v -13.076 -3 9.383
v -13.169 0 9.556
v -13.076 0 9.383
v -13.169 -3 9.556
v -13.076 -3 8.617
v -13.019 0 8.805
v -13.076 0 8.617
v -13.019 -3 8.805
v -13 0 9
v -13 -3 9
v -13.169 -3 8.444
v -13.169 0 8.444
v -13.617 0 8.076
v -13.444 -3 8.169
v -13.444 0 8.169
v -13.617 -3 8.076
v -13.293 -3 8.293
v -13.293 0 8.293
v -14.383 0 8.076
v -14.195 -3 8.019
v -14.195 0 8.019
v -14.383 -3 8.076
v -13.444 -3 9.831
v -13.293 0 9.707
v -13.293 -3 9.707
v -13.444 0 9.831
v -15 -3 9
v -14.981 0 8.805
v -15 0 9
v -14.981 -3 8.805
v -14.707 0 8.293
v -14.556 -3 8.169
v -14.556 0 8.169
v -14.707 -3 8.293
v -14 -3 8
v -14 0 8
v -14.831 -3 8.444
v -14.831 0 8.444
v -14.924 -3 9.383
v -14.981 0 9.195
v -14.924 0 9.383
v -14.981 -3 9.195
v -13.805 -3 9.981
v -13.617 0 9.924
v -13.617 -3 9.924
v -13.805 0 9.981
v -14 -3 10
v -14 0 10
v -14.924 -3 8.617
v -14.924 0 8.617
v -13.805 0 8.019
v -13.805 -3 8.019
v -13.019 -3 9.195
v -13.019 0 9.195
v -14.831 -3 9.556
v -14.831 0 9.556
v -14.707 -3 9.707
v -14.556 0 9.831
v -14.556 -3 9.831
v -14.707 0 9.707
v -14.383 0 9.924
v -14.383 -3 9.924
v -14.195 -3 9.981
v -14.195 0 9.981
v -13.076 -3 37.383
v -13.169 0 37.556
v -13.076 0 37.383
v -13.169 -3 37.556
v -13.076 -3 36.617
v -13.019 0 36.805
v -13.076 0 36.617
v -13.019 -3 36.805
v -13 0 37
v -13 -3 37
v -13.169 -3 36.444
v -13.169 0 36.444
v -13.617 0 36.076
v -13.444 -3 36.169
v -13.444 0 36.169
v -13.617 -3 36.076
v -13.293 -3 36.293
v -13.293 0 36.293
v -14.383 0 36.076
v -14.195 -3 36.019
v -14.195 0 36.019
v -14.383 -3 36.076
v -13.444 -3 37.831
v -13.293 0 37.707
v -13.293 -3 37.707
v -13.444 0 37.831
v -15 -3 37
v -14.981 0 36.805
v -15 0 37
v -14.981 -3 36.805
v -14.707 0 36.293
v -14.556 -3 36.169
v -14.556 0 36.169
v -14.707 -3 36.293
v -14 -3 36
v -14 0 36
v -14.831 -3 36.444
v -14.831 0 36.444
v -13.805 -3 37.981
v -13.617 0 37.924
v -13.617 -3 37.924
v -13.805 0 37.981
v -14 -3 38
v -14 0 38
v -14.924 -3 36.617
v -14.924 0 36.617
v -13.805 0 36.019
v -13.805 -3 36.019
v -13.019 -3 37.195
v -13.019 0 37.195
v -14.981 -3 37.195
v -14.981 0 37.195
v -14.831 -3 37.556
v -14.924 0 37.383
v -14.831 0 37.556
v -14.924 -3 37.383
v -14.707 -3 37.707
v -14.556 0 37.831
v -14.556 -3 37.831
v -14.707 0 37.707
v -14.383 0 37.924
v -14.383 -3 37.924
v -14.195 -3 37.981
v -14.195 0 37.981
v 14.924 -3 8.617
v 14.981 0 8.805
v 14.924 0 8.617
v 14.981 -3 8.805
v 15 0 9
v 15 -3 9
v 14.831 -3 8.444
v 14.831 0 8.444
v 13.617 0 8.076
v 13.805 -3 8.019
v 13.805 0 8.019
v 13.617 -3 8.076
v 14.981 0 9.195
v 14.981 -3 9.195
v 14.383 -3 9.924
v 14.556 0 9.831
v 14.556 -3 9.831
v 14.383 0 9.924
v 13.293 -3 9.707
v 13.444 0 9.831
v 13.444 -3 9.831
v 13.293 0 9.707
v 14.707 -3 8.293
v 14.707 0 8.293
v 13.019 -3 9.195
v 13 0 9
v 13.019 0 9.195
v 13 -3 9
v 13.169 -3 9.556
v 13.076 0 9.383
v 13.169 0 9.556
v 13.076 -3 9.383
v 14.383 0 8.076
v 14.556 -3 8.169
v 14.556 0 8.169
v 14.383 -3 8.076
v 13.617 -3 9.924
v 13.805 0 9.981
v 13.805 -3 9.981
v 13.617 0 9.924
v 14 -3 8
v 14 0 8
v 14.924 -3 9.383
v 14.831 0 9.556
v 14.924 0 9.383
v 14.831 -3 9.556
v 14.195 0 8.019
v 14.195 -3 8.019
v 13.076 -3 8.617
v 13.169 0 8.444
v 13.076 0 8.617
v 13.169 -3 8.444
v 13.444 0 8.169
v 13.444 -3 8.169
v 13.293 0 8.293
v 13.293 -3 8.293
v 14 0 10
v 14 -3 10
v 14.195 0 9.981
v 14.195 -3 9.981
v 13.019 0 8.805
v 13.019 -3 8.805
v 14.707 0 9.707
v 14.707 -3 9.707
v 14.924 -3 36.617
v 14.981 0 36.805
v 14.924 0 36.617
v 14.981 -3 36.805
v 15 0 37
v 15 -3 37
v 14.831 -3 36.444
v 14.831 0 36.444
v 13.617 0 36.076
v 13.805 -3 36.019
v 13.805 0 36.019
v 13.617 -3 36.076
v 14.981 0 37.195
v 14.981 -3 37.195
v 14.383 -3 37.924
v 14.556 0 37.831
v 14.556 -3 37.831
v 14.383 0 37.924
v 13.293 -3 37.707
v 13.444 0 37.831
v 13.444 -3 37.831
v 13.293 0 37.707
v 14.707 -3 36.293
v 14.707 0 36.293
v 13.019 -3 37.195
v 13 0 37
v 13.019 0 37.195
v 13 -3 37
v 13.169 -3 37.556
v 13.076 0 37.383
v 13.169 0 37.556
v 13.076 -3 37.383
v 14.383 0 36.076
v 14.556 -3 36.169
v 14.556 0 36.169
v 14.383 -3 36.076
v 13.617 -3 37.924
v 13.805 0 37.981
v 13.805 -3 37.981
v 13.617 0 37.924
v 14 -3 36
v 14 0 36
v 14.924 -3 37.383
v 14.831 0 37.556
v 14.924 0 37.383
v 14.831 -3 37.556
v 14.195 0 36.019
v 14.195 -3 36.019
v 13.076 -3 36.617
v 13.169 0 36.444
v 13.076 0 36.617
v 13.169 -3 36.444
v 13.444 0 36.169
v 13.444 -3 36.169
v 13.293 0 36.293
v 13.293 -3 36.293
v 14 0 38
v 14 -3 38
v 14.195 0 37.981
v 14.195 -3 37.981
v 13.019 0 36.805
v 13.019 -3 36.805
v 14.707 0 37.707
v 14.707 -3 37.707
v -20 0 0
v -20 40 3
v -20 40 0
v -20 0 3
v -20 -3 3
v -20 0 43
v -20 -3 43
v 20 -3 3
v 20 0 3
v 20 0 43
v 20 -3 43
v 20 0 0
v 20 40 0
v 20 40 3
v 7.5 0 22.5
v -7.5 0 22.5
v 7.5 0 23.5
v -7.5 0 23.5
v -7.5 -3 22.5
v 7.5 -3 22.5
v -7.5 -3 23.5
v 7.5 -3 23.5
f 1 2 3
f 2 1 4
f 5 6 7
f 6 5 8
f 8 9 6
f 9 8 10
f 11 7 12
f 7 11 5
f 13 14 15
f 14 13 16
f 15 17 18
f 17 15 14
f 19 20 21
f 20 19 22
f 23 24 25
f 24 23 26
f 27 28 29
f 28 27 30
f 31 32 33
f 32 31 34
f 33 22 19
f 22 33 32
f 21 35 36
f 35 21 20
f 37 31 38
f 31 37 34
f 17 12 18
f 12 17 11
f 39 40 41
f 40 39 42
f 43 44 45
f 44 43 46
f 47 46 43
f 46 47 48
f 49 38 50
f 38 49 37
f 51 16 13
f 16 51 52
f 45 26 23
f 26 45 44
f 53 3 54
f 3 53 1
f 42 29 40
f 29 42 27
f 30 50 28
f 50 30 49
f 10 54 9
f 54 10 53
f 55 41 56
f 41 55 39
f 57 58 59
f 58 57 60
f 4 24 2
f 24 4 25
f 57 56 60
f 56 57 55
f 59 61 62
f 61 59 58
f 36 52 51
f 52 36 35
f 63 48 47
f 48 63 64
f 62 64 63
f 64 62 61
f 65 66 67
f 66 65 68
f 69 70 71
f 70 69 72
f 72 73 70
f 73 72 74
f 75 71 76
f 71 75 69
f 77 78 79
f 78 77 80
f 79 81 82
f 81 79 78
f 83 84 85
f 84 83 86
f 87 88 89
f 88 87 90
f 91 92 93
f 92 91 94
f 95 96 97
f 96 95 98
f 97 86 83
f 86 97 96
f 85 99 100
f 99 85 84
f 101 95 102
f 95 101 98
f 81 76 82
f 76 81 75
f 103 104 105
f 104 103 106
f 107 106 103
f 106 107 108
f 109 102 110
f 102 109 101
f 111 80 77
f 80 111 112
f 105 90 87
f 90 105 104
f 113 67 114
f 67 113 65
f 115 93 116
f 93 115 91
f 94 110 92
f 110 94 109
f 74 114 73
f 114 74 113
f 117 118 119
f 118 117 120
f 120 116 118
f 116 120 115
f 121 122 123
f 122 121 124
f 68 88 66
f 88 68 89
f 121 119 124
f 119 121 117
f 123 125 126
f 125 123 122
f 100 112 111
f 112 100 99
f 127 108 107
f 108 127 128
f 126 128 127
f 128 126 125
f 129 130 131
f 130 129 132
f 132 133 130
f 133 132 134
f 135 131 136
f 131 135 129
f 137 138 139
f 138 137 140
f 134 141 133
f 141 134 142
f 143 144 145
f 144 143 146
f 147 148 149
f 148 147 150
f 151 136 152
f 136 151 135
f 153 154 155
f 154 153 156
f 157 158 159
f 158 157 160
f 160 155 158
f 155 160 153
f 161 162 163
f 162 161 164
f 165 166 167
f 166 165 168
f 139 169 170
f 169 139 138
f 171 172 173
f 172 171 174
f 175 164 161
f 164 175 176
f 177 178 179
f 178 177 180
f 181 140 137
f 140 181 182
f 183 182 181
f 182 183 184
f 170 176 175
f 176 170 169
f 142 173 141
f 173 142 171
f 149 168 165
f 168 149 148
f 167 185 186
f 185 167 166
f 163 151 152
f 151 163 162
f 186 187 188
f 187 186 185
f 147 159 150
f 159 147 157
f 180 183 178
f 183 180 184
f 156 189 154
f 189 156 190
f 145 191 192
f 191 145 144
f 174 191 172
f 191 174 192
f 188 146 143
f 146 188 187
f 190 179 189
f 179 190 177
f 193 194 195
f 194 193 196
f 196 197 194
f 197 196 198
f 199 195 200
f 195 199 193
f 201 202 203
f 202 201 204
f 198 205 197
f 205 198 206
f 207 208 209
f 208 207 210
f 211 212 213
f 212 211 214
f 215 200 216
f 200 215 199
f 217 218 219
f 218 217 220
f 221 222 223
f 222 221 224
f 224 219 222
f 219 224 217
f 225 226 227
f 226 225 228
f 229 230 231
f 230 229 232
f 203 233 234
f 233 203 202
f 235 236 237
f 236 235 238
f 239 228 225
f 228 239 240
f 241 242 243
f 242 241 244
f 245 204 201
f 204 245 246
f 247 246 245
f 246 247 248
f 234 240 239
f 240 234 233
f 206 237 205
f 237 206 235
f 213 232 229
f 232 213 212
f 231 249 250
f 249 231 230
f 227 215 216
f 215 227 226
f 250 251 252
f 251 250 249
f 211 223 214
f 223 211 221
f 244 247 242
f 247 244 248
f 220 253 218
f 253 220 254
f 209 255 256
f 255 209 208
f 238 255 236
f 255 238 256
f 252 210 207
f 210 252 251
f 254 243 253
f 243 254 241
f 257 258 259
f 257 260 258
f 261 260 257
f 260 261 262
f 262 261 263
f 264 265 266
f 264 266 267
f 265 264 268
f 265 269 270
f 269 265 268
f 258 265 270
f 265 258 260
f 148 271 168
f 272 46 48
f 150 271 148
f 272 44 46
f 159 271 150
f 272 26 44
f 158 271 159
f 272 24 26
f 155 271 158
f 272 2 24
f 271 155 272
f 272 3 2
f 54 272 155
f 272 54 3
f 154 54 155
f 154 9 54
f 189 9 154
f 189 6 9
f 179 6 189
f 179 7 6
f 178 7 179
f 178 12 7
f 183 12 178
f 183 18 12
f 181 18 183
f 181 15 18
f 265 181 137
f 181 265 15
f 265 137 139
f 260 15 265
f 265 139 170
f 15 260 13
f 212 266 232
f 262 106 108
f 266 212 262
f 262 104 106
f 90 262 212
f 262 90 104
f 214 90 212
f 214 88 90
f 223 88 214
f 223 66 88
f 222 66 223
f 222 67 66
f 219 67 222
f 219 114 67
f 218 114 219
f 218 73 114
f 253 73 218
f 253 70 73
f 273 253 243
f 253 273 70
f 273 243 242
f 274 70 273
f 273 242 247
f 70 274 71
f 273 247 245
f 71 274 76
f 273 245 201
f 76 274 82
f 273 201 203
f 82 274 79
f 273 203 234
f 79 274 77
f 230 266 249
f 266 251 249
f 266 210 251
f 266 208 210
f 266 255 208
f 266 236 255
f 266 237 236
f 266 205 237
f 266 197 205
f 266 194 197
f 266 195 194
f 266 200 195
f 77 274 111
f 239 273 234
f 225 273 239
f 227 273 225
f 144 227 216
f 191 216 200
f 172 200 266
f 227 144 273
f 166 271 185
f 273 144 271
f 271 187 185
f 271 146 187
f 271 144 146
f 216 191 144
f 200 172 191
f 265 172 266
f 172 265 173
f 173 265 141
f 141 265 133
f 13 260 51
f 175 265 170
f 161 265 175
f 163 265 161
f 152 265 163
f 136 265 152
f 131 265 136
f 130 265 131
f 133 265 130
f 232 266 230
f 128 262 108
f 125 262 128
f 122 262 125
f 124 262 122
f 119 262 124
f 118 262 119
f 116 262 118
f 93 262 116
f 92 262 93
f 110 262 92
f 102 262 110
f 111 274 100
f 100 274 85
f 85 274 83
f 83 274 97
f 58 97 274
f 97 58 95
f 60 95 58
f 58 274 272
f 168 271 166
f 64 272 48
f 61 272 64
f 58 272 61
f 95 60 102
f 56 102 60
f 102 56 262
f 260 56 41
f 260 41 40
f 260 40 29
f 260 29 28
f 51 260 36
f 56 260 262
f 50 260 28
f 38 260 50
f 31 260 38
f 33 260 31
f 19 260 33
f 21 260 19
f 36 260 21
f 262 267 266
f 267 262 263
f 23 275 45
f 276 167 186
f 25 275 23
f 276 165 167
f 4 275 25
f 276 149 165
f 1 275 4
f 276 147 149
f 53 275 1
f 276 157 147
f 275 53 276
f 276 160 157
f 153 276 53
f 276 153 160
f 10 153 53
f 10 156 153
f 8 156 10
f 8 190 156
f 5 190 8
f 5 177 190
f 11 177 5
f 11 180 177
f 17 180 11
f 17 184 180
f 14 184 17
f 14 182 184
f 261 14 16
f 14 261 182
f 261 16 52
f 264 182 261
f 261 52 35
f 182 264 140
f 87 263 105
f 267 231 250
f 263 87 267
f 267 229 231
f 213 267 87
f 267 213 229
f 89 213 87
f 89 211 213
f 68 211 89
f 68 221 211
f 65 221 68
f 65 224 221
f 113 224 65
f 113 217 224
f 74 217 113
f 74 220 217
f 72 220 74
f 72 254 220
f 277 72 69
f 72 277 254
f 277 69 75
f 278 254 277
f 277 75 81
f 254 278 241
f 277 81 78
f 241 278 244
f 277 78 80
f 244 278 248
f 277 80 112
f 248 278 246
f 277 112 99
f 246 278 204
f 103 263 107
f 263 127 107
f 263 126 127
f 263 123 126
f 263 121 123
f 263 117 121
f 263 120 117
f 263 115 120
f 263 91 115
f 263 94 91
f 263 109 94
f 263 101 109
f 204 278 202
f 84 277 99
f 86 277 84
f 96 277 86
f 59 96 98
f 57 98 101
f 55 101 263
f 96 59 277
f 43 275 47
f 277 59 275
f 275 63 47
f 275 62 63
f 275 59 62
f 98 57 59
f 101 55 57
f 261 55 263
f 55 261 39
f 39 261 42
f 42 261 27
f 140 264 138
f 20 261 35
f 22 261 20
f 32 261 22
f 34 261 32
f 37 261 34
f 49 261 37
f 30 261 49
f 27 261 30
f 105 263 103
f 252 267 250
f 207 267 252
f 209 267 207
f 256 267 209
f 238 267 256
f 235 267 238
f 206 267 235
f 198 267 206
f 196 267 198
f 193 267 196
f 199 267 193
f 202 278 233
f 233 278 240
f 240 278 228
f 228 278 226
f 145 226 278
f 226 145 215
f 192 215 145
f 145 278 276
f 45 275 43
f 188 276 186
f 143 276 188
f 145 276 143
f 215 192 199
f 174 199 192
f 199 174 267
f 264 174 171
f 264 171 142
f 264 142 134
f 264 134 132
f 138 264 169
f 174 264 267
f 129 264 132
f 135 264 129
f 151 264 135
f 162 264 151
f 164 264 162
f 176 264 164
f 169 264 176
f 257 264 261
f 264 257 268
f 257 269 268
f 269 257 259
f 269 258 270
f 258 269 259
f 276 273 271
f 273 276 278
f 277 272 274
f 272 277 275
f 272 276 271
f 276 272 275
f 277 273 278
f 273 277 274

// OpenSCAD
// 亚克力 MIPI 摄像头支架
// 单位：mm。模型由 3 mm 板材折弯/拼接形状近似；摄像头板和螺丝不包含在内。

// ---------- 可调整尺寸 ----------
plate_width = 40;          // 支架宽度
back_height = 40;          // 背板沿板面长度
base_depth = 40;           // 底板前后深度
plate_thickness = 3;       // 亚克力厚度
back_lean_deg = 0;         // 背板垂直于底板，即底板与背板夹角为 90°

camera_board_size = 35;    // 摄像头板外形参考尺寸
camera_hole_pitch = 28;    // 摄像头板安装孔中心距
camera_hole_d = 2;         // 安装孔直径

ffc_slot_length = 15;      // 排线槽长度
ffc_slot_width = 1;        // 排线槽宽度
// --------------------------------

// 在 Y-Z 平面定义底板和倾斜背板的连续截面，再沿 X 方向挤出支架宽度。
module bracket_body() {
    a = back_lean_deg;
    t = plate_thickness;
    h = back_height;
    inner_top_y = -h * sin(a);
    inner_top_z = t + h * cos(a);

    multmatrix([
        [0, 0, 1, 0],
        [1, 0, 0, 0],
        [0, 1, 0, 0],
        [0, 0, 0, 1]
    ])
    linear_extrude(height=plate_width, center=true, convexity=10)
        polygon(points=[
            [0, 0],
            [base_depth, 0],
            [base_depth, t],
            [0, t],
            [inner_top_y, inner_top_z],
            [inner_top_y - t*cos(a), inner_top_z - t*sin(a)],
            [-t*cos(a), t - t*sin(a)]
        ]);
}

// 四个孔按摄像头板的 28 mm 方形孔距布置，板中心对准背板中心。
module camera_mount_holes() {
    a = back_lean_deg;
    for (x = [-camera_hole_pitch/2, camera_hole_pitch/2]) {
        for (s = [back_height/2 - camera_hole_pitch/2,
                  back_height/2 + camera_hole_pitch/2]) {
            translate([x, -s*sin(a), plate_thickness + s*cos(a)])
                rotate([a - 90, 0, 0])
                    cylinder(d=camera_hole_d, h=20, center=true, $fn=32);
        }
    }
}

// 背板中心的 FFC 排线通槽，槽长沿支架宽度方向。
module ffc_slot() {
    a = back_lean_deg;
    s = back_height/2;
    translate([0, -s*sin(a), plate_thickness + s*cos(a)])
        rotate([a - 90, 0, 0])
            cube([ffc_slot_length, ffc_slot_width, 20], center=true);
}

difference() {
    bracket_body();
    camera_mount_holes();
    ffc_slot();
}
